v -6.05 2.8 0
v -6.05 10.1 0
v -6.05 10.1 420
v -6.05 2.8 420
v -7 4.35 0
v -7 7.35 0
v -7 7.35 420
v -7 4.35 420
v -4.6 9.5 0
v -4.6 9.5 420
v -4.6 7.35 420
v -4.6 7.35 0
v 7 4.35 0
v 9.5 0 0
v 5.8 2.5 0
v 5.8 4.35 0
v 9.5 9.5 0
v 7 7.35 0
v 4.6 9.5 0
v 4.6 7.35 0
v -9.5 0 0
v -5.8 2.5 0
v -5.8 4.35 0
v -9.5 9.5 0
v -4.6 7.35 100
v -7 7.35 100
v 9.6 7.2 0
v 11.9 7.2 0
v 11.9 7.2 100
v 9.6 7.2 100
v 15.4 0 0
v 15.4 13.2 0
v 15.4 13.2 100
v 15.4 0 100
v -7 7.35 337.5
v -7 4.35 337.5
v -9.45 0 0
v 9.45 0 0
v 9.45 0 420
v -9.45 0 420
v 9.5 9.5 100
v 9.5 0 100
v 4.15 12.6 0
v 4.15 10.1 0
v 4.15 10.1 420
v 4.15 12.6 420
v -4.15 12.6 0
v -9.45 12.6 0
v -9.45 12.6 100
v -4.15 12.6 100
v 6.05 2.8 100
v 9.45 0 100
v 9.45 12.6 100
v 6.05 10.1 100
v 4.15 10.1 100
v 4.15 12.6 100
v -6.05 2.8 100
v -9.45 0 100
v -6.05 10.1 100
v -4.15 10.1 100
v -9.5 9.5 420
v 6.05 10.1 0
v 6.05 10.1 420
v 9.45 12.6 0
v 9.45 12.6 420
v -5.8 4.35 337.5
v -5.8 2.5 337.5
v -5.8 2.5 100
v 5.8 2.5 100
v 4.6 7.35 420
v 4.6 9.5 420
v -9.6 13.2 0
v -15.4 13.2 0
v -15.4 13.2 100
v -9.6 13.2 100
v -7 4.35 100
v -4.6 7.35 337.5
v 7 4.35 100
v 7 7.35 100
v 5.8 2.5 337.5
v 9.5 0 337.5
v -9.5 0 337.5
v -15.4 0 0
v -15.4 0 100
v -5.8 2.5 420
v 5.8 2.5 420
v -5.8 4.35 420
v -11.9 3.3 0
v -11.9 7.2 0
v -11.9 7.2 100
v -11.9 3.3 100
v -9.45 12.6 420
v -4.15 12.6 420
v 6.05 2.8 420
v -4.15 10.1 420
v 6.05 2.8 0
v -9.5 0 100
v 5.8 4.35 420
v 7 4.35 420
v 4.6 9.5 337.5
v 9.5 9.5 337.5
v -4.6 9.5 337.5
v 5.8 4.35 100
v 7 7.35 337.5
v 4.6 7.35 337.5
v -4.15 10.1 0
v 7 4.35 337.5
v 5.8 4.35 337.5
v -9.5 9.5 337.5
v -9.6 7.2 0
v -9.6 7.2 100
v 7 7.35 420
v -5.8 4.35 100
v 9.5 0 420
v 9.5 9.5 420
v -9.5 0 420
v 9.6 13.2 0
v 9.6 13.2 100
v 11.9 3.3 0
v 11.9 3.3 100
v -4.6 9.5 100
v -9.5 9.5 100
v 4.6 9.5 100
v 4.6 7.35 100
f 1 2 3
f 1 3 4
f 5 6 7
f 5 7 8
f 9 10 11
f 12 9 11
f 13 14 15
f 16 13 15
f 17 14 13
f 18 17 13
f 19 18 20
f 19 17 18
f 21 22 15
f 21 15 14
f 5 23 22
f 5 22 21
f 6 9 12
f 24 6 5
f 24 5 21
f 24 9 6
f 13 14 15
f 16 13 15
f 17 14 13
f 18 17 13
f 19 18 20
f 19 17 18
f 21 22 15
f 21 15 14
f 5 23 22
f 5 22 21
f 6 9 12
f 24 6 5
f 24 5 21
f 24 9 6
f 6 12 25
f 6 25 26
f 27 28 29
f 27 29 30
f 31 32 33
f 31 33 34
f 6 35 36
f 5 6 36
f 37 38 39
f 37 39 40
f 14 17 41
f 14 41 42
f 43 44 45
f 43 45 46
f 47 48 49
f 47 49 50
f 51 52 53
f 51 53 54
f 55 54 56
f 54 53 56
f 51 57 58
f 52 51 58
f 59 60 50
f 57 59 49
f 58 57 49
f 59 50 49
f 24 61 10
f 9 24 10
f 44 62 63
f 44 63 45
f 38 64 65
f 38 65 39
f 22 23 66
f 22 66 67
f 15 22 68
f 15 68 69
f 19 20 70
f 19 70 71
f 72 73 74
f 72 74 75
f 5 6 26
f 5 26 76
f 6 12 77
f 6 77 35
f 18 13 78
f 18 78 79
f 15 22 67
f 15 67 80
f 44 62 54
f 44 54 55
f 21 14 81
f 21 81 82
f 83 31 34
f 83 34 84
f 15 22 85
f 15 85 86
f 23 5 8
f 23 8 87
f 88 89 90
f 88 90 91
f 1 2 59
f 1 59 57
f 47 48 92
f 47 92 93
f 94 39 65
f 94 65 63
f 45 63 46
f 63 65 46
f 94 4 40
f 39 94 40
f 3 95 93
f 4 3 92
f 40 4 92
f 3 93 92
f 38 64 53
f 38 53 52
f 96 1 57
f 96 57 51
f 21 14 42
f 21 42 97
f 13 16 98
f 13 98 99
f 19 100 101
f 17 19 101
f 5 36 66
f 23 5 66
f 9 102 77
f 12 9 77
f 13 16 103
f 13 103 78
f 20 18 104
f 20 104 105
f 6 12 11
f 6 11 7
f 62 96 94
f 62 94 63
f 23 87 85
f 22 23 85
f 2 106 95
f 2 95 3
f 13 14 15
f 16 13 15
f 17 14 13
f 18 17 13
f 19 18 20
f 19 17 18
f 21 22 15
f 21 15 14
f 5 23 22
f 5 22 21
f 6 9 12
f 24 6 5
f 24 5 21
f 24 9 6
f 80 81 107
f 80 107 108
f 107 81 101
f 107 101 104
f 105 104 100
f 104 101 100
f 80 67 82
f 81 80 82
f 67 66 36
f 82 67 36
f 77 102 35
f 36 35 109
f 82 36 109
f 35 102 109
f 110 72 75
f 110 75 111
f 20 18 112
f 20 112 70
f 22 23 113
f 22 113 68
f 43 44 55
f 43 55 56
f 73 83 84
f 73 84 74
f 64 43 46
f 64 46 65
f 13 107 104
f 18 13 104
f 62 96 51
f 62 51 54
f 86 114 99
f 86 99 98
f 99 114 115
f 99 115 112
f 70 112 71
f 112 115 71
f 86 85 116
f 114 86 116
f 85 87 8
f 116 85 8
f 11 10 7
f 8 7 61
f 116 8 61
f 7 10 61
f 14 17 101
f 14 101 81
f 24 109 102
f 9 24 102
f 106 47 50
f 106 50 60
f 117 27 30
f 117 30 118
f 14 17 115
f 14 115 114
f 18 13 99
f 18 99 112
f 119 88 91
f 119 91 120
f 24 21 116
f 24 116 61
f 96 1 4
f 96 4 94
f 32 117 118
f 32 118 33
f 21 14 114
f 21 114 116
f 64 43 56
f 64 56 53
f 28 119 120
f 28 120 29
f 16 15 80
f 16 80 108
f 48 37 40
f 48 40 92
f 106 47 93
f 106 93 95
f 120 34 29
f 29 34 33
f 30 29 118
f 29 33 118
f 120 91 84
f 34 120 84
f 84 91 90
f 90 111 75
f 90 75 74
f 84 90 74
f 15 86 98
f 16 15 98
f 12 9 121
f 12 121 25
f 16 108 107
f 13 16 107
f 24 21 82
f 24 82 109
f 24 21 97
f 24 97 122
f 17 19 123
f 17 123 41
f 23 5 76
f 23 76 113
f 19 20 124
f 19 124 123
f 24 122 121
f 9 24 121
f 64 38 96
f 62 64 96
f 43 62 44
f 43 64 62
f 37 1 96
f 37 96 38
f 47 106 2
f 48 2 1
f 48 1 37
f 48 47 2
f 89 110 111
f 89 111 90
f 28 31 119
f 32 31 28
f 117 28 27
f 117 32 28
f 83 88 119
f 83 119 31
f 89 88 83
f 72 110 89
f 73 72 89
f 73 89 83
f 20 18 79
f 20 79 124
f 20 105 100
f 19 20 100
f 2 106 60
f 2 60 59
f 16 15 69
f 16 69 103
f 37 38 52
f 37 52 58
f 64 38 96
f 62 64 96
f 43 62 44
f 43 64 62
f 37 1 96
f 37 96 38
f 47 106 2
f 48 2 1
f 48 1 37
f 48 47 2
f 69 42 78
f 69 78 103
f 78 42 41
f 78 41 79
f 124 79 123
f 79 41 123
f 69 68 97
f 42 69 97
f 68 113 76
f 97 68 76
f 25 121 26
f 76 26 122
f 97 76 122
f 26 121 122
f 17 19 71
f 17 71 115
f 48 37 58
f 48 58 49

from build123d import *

# Parameters (mm, degrees)
PAD_DEPTH    = 100
PAD001_DEPTH = 100
PAD002_DEPTH = 420
PAD003_DEPTH = 100
PAD004_DEPTH = 420
PAD005_DEPTH = 337.5


with BuildPart() as body:
    # Sketch → Pad (new body)
    with BuildSketch(Plane.XY):
        Polygon((-15.4, 13.2), (-9.6, 13.2), (-9.6, 7.2), (-11.9, 7.2), (-11.9, 3.3), (11.9, 3.3), (11.9, 7.2), (9.6, 7.2), (9.6, 13.2), (15.4, 13.2), (15.4, 0), (-15.4, 0), align=None)
    extrude(amount=PAD_DEPTH)


with BuildPart() as body001:
    # Sketch001 → Pad001 (new body)
    with BuildSketch(Plane.XY):
        Polygon((-9.45, 12.6), (-4.15, 12.6), (-4.15, 10.1), (-6.05, 10.1), (-6.05, 2.8), (6.05, 2.8), (6.05, 10.1), (4.15, 10.1), (4.15, 12.6), (9.45, 12.6), (9.45, 0), (-9.45, 0), align=None)
    extrude(amount=PAD001_DEPTH)


with BuildPart() as slot_19x12_6x420:
    # Sketch002 → Pad002 (new body)
    with BuildSketch(Plane.XY):
        Polygon((-9.45, 12.6), (-4.15, 12.6), (-4.15, 10.1), (-6.05, 10.1), (-6.05, 2.8), (6.05, 2.8), (6.05, 10.1), (4.15, 10.1), (4.15, 12.6), (9.45, 12.6), (9.45, 0), (-9.45, 0), align=None)
    extrude(amount=PAD002_DEPTH)


with BuildPart() as body003:
    # Sketch003 → Pad003 (new body)
    with BuildSketch(Plane.XY):
        Polygon((-9.5, 9.5), (-4.6, 9.5), (-4.6, 7.35), (-7, 7.35), (-7, 4.35), (-5.8, 4.35), (-5.8, 2.5), (5.8, 2.5), (5.8, 4.35), (7, 4.35), (7, 7.35), (4.6, 7.35), (4.6, 9.5), (9.5, 9.5), (9.5, 0), (-9.5, 0), align=None)
    extrude(amount=PAD003_DEPTH)


with BuildPart() as slim_slot_19x9_5x420:
    # Sketch004 → Pad004 (new body)
    with BuildSketch(Plane.XY):
        Polygon((-9.5, 9.5), (-4.6, 9.5), (-4.6, 7.35), (-7, 7.35), (-7, 4.35), (-5.8, 4.35), (-5.8, 2.5), (5.8, 2.5), (5.8, 4.35), (7, 4.35), (7, 7.35), (4.6, 7.35), (4.6, 9.5), (9.5, 9.5), (9.5, 0), (-9.5, 0), align=None)
    extrude(amount=PAD004_DEPTH)


with BuildPart() as slim_slot_19x9_5x337:
    # Sketch005 → Pad005 (new body)
    with BuildSketch(Plane.XY):
        Polygon((-9.5, 9.5), (-4.6, 9.5), (-4.6, 7.35), (-7, 7.35), (-7, 4.35), (-5.8, 4.35), (-5.8, 2.5), (5.8, 2.5), (5.8, 4.35), (7, 4.35), (7, 7.35), (4.6, 7.35), (4.6, 9.5), (9.5, 9.5), (9.5, 0), (-9.5, 0), align=None)
    extrude(amount=PAD005_DEPTH)


solid = Compound([body.part, body001.part, slot_19x12_6x420.part, body003.part, slim_slot_19x9_5x420.part, slim_slot_19x9_5x337.part])
